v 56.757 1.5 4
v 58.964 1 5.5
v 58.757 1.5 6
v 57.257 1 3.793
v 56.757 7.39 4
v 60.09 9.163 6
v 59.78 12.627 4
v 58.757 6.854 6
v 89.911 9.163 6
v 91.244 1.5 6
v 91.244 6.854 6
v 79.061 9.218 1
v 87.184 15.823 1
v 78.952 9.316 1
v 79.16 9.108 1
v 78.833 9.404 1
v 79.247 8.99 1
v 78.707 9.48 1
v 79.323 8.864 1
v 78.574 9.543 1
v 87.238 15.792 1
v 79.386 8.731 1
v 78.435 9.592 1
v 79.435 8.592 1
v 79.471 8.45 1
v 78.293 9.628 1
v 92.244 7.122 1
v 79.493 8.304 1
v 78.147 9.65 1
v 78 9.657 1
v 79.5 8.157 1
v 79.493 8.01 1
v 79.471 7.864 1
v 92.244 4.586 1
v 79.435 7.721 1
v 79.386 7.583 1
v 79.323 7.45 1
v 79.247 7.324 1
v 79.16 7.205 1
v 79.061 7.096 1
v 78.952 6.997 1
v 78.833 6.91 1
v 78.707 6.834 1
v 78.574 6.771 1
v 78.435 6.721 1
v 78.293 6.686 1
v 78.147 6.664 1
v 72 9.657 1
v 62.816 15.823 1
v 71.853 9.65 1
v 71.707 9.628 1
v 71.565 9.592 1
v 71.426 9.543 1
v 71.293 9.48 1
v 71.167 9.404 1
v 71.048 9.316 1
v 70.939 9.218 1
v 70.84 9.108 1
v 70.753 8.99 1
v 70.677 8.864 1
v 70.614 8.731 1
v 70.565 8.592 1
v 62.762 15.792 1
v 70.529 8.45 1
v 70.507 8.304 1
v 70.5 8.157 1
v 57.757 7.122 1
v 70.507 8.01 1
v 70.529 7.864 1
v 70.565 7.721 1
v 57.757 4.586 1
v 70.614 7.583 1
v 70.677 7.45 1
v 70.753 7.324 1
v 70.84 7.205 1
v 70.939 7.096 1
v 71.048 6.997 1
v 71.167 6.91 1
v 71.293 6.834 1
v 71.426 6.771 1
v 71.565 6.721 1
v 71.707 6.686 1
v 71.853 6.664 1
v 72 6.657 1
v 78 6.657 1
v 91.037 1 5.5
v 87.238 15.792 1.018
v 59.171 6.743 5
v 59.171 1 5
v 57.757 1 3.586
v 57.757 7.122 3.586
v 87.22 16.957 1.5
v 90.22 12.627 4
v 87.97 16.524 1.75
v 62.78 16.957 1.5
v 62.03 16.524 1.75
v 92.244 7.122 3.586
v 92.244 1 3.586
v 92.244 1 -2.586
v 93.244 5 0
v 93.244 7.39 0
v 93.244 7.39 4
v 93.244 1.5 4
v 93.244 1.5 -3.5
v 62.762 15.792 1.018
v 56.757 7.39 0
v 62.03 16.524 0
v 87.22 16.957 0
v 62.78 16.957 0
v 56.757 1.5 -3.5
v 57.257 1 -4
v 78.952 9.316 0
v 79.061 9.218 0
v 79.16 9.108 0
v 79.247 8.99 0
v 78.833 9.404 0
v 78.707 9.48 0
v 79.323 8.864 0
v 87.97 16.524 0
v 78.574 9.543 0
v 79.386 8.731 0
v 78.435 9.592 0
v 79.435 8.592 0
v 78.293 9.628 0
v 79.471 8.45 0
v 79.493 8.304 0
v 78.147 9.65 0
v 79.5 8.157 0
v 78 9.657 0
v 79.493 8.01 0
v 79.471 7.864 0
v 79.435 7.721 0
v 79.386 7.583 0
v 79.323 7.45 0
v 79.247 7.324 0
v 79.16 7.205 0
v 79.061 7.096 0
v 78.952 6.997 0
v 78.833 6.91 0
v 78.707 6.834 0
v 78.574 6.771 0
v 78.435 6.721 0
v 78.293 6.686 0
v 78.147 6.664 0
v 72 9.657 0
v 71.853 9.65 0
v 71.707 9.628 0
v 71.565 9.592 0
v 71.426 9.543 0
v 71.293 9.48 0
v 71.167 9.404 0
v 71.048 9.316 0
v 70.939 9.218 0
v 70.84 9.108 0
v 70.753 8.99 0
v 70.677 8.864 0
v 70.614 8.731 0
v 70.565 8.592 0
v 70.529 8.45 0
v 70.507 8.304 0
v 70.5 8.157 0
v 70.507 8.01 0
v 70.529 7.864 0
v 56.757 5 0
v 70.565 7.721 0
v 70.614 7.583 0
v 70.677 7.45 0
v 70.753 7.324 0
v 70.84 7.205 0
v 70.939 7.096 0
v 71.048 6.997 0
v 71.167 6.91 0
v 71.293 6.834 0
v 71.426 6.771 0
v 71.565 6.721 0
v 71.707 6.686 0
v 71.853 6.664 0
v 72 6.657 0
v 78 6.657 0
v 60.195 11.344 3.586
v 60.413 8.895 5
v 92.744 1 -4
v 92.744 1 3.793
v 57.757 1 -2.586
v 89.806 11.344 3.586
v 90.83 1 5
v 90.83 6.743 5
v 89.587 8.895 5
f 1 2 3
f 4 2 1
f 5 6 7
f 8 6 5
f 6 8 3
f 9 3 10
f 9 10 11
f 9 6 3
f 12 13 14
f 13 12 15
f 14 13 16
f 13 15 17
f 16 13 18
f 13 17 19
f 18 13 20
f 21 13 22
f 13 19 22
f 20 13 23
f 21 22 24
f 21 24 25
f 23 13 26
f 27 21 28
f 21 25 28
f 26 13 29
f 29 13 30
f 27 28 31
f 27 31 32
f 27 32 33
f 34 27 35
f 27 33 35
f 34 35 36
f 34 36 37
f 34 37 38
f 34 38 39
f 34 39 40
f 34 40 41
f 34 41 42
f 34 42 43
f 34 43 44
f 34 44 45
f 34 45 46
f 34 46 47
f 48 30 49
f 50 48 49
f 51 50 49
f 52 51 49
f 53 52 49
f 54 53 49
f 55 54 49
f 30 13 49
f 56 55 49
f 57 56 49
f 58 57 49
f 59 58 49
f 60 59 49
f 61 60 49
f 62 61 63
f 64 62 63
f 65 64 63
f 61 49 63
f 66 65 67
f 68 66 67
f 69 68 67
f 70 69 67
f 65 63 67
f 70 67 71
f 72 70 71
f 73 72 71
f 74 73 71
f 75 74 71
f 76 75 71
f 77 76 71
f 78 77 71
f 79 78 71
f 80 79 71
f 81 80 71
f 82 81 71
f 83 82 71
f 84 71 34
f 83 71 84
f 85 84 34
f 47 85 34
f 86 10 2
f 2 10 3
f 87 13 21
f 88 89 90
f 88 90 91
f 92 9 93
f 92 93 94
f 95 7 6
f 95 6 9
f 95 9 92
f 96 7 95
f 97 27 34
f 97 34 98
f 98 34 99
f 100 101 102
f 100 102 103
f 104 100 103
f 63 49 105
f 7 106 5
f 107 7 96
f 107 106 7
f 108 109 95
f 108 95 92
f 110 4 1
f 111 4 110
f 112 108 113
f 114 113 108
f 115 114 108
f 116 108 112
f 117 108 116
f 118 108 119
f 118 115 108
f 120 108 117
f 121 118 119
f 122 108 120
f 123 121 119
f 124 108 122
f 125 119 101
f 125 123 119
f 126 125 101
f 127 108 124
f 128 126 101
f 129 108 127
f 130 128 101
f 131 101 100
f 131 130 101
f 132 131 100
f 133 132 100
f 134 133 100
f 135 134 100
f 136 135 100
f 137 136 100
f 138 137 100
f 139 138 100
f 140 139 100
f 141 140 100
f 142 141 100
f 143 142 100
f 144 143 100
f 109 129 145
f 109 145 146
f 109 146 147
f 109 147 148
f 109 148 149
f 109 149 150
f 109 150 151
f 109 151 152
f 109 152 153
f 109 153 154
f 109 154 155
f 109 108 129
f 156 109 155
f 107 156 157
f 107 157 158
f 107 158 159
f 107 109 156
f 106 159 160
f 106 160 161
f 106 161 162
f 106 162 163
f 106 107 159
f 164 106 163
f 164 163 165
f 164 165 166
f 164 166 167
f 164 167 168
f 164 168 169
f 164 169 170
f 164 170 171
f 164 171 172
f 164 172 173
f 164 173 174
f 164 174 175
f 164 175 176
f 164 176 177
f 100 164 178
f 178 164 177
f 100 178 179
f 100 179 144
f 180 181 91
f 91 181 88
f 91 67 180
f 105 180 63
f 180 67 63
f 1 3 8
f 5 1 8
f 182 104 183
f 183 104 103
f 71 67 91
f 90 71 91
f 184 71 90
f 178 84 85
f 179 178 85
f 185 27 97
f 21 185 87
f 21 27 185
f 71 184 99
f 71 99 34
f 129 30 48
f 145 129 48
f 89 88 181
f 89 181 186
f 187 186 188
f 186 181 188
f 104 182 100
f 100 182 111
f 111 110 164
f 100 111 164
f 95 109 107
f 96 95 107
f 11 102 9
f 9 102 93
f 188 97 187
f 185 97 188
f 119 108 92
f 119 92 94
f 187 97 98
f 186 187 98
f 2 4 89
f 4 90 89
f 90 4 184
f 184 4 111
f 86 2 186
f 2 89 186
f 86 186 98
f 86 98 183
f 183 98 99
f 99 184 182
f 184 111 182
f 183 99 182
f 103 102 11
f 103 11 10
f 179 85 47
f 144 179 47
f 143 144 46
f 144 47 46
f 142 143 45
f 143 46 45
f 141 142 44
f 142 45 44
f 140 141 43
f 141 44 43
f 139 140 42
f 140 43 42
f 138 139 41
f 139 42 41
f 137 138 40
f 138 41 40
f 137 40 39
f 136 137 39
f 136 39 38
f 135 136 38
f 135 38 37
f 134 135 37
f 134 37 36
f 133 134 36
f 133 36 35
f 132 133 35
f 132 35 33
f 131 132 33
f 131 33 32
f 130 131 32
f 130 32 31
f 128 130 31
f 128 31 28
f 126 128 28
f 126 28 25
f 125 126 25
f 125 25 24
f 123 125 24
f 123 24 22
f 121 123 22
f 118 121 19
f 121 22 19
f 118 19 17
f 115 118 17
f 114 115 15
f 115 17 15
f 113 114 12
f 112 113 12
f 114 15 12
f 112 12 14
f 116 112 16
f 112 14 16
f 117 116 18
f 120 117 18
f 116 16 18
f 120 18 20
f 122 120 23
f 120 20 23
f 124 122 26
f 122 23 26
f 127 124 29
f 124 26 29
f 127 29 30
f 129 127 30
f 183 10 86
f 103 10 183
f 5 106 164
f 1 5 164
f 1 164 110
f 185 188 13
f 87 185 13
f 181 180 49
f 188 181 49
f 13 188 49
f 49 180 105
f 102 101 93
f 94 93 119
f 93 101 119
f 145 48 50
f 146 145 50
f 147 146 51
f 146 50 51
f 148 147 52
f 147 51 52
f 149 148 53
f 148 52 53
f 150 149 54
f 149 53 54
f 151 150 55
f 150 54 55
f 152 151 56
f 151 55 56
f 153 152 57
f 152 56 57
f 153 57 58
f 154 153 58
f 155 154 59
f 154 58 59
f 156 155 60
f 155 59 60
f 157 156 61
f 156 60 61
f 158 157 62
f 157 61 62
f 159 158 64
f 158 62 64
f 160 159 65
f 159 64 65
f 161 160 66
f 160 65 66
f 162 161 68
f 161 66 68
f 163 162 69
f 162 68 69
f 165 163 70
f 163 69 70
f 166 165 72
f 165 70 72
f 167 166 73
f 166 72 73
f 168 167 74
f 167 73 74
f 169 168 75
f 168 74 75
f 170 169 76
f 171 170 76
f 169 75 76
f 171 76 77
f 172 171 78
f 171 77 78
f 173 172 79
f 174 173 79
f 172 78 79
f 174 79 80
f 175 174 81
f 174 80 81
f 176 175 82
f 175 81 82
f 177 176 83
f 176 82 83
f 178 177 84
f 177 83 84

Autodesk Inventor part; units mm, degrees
ref_plane "YZ Plane" through (0, 0, 0) normal (1, 0, 0) x (0, 1, 0)
ref_plane "XZ Plane" through (0, 0, 0) normal (0, 1, 0) x (-1, 0, 0)
ref_plane "XY Plane" through (0, 0, 0) normal (0, 0, 1) x (1, 0, 0)
sketch "Эскиз1" plane through (0, 0, 0) normal (0, 0, 1) x (1, 0, 0)
  line L0 (54.2, 25) -> (95.8, 25) projected
  line L1 (54.2, 25) -> (54.2, 6.4142) projected
  line L2 (54.2, 6.4142) -> (55.9, 6.4142) projected
  line L3 (55.9, 5) -> (55.9, 6.4142) projected
  line L4 (94.1, 5) -> (55.9, 5) projected
  line L5 (94.1, 5) -> (94.1, 6.4142) projected
  line L6 (95.8, 6.4142) -> (94.1, 6.4142) projected
  line L7 (95.8, 25) -> (95.8, 6.4142) projected
  line L8 (78, 9.4569) -> (72, 9.4569) projected
  arc A0 (78, 6.4569) -> (78, 9.4569) centre (78, 7.9569) ccw projected
  line L9 (72, 6.4569) -> (78, 6.4569) projected
  arc A1 (72, 9.4569) -> (72, 6.4569) centre (72, 7.9569) ccw projected
  line L10 (52.2, 39.2872) -> (53.2, 35.5552) projected
  line L11 (52.2, 39.2872) -> (52.2, 10.774) projected
  line L12 (52.2, 10.774) -> (53.6142, 7.3598) projected
  line L13 (53.6142, 7.3598) -> (54.2, 6.774) projected
  line L14 (54.2, 6.774) -> (54.2, 8.5587) projected
  line L15 (54.2, 8.5587) -> (53.2, 10.9729) projected
  line L16 (53.2, 10.9729) -> (53.2, 35.5552) projected
  line L17 (97.8, 39.2872) -> (96.8, 35.5552) projected
  line L18 (96.8, 10.9729) -> (96.8, 35.5552) projected
  line L19 (95.8, 8.5587) -> (96.8, 10.9729) projected
  line L20 (95.8, 6.774) -> (95.8, 8.5587) projected
  line L21 (96.3858, 7.3598) -> (95.8, 6.774) projected
  line L22 (97.8, 10.774) -> (96.3858, 7.3598) projected
  line L23 (97.8, 39.2872) -> (97.8, 10.774) projected
  line L24 (53.6142, 7.3598) -> (54.2, 6.774) projected
  line L25 (10.2, 7.3598) -> (53.6142, 7.3598) projected
  line L26 (10.2, 1) -> (10.2, 7.3598) projected
  line L27 (10.2, 1) -> (139.8, 1) projected
  line L28 (139.8, 1) -> (139.8, 7.3598) projected
  line L29 (139.8, 7.3598) -> (96.3858, 7.3598) projected
  line L30 (96.3858, 7.3598) -> (95.8, 6.774) projected
  line L31 (95.8, 6.774) -> (95.8, 6.7) projected
  line L32 (95.8, 6.7) -> (94.1, 5) projected
  line L33 (94.1, 5) -> (55.9, 5) projected
  line L34 (54.2, 6.7) -> (55.9, 5) projected
  line L35 (54.2, 6.774) -> (54.2, 6.7) projected
  line L36 (93.2439, 7.3899) -> (87.9704, 16.5238)
  line L37 (62.7804, 16.9569) -> (87.2204, 16.9569)
  line L38 (56.7569, 7.3899) -> (62.0304, 16.5238)
  line L39 (87.2204, 16.9569) -> (87.9704, 16.5238)
  line L40 (62.7804, 16.9569) -> (62.0304, 16.5238)
  line L41 (72, 7.9569) -> (78, 7.9569)
  line L42 (56.7569, 7.3899) -> (56.7569, 1)
  line L43 (93.2439, 7.3899) -> (93.2439, 1)
  point P0 (0, 0)
  point P1 (75, 7.9569)
  dimension "d0" = 150
  dimension "d1" = 120
  dimension "d2" = 5.2735
  dimension "d3" = 9.567
  dimension "d4" = 23.517
  dimension "d5" = 31.5987
  dimension "d6" = 31.5987
  dimension "d7" = 9
extrude "Выдавливание1" add sketch "Эскиз1" along normal blind 6 and the other way blind 4 contours L42 L38 L40 L37 L39 L36 L43 L4 | L4 L43 L27 L42 | A0 L9 A1 L8
sketch "Эскиз2" plane through (56.7569, 1, 6) normal (-1, 0, 0) x (0, 0, 1)
  line L0 (-6, 18.0421) -> (-6, 6.7284) projected
  line L1 (-10, 0) -> (-3.6402, 6.3598) projected
  line L2 (-6, 6.7284) -> (-6, 4)
  line L3 (-10, 15.5238) -> (0, 15.5238) projected
  line L4 (0, 15.9569) -> (0, 15.5238) projected
  line L5 (-10, 15.9569) -> (0, 15.9569) projected
  line L6 (-10, 15.5238) -> (-10, 15.9569) projected
  line L7 (-10, 6.3899) -> (0, 6.3899) projected
  line L8 (0, 15.5238) -> (0, 6.3899) projected
  line L9 (-10, 15.5238) -> (0, 15.5238) projected
  line L10 (-10, 6.3899) -> (-10, 15.5238) projected
  line L11 (-10, 0) -> (0, 0) projected
  line L12 (0, 6.3899) -> (0, 0) projected
  line L13 (-10, 6.3899) -> (0, 6.3899) projected
  line L14 (-10, 0) -> (-10, 6.3899) projected
  line L15 (0, 6.3899) -> (0, 15.5238) projected
  line L16 (0, 8.1626) -> (-4.5, 15.9569)
  line L17 (0, 15.9569) -> (-10, 15.9569) projected
  point P0 (-6, -1)
  point P1 (-6, 15.9569)
  dimension "d13" = 30
  dimension "d14" = 1.5
extrude "Выдавливание2" cut sketch "Эскиз2" against normal through all contours L0 L3 L6 L5 | L0 L2 L7 L10 L3 | L5 L4 L3 L16 | L3 L8 L16 | L2 L1 L14 L7
chamfer "Фаска1" distance 2 angle 45 4 edges at (93.2439, 4.1949, 6) (56.7569, 4.1949, 6) (57.2686, 8.2762, 6) (92.7321, 8.2762, 6)
shell "Оболочка1" thickness 1 removed faces 1 at (80.4149, 1, -0.6667)
sketch "Эскиз3" plane through (57.7569, 4.5858, 1) normal (0, 0, 1) x (1, 0, 0)
  arc A0 (14.2431, 5.0711) -> (14.2431, 2.0711) centre (14.2431, 3.5711) ccw
  line L0 (20.2431, 5.0711) -> (14.2431, 5.0711)
  arc A1 (20.2431, 2.0711) -> (20.2431, 5.0711) centre (20.2431, 3.5711) ccw
  line L1 (14.2431, 2.0711) -> (20.2431, 2.0711)
  line L2 (35.487, 0.4142) -> (35.487, 2.8041) projected
  line L3 (-1, 0.4142) -> (35.487, 0.4142) projected
  line L4 (-1, 2.8041) -> (-1, 0.4142) projected
  line L5 (4.2735, 11.9381) -> (-1, 2.8041) projected
  line L6 (5.0235, 12.3711) -> (4.2735, 11.9381) projected
  line L7 (29.4635, 12.3711) -> (5.0235, 12.3711) projected
  line L8 (30.2135, 11.9381) -> (29.4635, 12.3711) projected
  line L9 (35.487, 2.8041) -> (30.2135, 11.9381) projected
  line L10 (20.2431, 4.8711) -> (14.2431, 4.8711) projected
  point P0 (-57.7569, -4.5858)
  point P1 (17.2435, 3.5711)
  dimension "d21" = 1.5
  dimension "d22" = 1.5
  dimension "d23" = 3.3538
  dimension "d24" = 6
  dimension "d25" = 0.2
extrude "Выдавливание3" cut sketch "Эскиз3" against normal blind 6 contours L0 A1 L1 A0
chamfer "Фаска2" distance 0.5 angle 45 5 edges at (75.0004, 1, 6) (56.7569, 1, 0) (57.7569, 1, 5) (93.2439, 1, 0) (92.2439, 1, 5)
properties part number "РучкаКрышки"
